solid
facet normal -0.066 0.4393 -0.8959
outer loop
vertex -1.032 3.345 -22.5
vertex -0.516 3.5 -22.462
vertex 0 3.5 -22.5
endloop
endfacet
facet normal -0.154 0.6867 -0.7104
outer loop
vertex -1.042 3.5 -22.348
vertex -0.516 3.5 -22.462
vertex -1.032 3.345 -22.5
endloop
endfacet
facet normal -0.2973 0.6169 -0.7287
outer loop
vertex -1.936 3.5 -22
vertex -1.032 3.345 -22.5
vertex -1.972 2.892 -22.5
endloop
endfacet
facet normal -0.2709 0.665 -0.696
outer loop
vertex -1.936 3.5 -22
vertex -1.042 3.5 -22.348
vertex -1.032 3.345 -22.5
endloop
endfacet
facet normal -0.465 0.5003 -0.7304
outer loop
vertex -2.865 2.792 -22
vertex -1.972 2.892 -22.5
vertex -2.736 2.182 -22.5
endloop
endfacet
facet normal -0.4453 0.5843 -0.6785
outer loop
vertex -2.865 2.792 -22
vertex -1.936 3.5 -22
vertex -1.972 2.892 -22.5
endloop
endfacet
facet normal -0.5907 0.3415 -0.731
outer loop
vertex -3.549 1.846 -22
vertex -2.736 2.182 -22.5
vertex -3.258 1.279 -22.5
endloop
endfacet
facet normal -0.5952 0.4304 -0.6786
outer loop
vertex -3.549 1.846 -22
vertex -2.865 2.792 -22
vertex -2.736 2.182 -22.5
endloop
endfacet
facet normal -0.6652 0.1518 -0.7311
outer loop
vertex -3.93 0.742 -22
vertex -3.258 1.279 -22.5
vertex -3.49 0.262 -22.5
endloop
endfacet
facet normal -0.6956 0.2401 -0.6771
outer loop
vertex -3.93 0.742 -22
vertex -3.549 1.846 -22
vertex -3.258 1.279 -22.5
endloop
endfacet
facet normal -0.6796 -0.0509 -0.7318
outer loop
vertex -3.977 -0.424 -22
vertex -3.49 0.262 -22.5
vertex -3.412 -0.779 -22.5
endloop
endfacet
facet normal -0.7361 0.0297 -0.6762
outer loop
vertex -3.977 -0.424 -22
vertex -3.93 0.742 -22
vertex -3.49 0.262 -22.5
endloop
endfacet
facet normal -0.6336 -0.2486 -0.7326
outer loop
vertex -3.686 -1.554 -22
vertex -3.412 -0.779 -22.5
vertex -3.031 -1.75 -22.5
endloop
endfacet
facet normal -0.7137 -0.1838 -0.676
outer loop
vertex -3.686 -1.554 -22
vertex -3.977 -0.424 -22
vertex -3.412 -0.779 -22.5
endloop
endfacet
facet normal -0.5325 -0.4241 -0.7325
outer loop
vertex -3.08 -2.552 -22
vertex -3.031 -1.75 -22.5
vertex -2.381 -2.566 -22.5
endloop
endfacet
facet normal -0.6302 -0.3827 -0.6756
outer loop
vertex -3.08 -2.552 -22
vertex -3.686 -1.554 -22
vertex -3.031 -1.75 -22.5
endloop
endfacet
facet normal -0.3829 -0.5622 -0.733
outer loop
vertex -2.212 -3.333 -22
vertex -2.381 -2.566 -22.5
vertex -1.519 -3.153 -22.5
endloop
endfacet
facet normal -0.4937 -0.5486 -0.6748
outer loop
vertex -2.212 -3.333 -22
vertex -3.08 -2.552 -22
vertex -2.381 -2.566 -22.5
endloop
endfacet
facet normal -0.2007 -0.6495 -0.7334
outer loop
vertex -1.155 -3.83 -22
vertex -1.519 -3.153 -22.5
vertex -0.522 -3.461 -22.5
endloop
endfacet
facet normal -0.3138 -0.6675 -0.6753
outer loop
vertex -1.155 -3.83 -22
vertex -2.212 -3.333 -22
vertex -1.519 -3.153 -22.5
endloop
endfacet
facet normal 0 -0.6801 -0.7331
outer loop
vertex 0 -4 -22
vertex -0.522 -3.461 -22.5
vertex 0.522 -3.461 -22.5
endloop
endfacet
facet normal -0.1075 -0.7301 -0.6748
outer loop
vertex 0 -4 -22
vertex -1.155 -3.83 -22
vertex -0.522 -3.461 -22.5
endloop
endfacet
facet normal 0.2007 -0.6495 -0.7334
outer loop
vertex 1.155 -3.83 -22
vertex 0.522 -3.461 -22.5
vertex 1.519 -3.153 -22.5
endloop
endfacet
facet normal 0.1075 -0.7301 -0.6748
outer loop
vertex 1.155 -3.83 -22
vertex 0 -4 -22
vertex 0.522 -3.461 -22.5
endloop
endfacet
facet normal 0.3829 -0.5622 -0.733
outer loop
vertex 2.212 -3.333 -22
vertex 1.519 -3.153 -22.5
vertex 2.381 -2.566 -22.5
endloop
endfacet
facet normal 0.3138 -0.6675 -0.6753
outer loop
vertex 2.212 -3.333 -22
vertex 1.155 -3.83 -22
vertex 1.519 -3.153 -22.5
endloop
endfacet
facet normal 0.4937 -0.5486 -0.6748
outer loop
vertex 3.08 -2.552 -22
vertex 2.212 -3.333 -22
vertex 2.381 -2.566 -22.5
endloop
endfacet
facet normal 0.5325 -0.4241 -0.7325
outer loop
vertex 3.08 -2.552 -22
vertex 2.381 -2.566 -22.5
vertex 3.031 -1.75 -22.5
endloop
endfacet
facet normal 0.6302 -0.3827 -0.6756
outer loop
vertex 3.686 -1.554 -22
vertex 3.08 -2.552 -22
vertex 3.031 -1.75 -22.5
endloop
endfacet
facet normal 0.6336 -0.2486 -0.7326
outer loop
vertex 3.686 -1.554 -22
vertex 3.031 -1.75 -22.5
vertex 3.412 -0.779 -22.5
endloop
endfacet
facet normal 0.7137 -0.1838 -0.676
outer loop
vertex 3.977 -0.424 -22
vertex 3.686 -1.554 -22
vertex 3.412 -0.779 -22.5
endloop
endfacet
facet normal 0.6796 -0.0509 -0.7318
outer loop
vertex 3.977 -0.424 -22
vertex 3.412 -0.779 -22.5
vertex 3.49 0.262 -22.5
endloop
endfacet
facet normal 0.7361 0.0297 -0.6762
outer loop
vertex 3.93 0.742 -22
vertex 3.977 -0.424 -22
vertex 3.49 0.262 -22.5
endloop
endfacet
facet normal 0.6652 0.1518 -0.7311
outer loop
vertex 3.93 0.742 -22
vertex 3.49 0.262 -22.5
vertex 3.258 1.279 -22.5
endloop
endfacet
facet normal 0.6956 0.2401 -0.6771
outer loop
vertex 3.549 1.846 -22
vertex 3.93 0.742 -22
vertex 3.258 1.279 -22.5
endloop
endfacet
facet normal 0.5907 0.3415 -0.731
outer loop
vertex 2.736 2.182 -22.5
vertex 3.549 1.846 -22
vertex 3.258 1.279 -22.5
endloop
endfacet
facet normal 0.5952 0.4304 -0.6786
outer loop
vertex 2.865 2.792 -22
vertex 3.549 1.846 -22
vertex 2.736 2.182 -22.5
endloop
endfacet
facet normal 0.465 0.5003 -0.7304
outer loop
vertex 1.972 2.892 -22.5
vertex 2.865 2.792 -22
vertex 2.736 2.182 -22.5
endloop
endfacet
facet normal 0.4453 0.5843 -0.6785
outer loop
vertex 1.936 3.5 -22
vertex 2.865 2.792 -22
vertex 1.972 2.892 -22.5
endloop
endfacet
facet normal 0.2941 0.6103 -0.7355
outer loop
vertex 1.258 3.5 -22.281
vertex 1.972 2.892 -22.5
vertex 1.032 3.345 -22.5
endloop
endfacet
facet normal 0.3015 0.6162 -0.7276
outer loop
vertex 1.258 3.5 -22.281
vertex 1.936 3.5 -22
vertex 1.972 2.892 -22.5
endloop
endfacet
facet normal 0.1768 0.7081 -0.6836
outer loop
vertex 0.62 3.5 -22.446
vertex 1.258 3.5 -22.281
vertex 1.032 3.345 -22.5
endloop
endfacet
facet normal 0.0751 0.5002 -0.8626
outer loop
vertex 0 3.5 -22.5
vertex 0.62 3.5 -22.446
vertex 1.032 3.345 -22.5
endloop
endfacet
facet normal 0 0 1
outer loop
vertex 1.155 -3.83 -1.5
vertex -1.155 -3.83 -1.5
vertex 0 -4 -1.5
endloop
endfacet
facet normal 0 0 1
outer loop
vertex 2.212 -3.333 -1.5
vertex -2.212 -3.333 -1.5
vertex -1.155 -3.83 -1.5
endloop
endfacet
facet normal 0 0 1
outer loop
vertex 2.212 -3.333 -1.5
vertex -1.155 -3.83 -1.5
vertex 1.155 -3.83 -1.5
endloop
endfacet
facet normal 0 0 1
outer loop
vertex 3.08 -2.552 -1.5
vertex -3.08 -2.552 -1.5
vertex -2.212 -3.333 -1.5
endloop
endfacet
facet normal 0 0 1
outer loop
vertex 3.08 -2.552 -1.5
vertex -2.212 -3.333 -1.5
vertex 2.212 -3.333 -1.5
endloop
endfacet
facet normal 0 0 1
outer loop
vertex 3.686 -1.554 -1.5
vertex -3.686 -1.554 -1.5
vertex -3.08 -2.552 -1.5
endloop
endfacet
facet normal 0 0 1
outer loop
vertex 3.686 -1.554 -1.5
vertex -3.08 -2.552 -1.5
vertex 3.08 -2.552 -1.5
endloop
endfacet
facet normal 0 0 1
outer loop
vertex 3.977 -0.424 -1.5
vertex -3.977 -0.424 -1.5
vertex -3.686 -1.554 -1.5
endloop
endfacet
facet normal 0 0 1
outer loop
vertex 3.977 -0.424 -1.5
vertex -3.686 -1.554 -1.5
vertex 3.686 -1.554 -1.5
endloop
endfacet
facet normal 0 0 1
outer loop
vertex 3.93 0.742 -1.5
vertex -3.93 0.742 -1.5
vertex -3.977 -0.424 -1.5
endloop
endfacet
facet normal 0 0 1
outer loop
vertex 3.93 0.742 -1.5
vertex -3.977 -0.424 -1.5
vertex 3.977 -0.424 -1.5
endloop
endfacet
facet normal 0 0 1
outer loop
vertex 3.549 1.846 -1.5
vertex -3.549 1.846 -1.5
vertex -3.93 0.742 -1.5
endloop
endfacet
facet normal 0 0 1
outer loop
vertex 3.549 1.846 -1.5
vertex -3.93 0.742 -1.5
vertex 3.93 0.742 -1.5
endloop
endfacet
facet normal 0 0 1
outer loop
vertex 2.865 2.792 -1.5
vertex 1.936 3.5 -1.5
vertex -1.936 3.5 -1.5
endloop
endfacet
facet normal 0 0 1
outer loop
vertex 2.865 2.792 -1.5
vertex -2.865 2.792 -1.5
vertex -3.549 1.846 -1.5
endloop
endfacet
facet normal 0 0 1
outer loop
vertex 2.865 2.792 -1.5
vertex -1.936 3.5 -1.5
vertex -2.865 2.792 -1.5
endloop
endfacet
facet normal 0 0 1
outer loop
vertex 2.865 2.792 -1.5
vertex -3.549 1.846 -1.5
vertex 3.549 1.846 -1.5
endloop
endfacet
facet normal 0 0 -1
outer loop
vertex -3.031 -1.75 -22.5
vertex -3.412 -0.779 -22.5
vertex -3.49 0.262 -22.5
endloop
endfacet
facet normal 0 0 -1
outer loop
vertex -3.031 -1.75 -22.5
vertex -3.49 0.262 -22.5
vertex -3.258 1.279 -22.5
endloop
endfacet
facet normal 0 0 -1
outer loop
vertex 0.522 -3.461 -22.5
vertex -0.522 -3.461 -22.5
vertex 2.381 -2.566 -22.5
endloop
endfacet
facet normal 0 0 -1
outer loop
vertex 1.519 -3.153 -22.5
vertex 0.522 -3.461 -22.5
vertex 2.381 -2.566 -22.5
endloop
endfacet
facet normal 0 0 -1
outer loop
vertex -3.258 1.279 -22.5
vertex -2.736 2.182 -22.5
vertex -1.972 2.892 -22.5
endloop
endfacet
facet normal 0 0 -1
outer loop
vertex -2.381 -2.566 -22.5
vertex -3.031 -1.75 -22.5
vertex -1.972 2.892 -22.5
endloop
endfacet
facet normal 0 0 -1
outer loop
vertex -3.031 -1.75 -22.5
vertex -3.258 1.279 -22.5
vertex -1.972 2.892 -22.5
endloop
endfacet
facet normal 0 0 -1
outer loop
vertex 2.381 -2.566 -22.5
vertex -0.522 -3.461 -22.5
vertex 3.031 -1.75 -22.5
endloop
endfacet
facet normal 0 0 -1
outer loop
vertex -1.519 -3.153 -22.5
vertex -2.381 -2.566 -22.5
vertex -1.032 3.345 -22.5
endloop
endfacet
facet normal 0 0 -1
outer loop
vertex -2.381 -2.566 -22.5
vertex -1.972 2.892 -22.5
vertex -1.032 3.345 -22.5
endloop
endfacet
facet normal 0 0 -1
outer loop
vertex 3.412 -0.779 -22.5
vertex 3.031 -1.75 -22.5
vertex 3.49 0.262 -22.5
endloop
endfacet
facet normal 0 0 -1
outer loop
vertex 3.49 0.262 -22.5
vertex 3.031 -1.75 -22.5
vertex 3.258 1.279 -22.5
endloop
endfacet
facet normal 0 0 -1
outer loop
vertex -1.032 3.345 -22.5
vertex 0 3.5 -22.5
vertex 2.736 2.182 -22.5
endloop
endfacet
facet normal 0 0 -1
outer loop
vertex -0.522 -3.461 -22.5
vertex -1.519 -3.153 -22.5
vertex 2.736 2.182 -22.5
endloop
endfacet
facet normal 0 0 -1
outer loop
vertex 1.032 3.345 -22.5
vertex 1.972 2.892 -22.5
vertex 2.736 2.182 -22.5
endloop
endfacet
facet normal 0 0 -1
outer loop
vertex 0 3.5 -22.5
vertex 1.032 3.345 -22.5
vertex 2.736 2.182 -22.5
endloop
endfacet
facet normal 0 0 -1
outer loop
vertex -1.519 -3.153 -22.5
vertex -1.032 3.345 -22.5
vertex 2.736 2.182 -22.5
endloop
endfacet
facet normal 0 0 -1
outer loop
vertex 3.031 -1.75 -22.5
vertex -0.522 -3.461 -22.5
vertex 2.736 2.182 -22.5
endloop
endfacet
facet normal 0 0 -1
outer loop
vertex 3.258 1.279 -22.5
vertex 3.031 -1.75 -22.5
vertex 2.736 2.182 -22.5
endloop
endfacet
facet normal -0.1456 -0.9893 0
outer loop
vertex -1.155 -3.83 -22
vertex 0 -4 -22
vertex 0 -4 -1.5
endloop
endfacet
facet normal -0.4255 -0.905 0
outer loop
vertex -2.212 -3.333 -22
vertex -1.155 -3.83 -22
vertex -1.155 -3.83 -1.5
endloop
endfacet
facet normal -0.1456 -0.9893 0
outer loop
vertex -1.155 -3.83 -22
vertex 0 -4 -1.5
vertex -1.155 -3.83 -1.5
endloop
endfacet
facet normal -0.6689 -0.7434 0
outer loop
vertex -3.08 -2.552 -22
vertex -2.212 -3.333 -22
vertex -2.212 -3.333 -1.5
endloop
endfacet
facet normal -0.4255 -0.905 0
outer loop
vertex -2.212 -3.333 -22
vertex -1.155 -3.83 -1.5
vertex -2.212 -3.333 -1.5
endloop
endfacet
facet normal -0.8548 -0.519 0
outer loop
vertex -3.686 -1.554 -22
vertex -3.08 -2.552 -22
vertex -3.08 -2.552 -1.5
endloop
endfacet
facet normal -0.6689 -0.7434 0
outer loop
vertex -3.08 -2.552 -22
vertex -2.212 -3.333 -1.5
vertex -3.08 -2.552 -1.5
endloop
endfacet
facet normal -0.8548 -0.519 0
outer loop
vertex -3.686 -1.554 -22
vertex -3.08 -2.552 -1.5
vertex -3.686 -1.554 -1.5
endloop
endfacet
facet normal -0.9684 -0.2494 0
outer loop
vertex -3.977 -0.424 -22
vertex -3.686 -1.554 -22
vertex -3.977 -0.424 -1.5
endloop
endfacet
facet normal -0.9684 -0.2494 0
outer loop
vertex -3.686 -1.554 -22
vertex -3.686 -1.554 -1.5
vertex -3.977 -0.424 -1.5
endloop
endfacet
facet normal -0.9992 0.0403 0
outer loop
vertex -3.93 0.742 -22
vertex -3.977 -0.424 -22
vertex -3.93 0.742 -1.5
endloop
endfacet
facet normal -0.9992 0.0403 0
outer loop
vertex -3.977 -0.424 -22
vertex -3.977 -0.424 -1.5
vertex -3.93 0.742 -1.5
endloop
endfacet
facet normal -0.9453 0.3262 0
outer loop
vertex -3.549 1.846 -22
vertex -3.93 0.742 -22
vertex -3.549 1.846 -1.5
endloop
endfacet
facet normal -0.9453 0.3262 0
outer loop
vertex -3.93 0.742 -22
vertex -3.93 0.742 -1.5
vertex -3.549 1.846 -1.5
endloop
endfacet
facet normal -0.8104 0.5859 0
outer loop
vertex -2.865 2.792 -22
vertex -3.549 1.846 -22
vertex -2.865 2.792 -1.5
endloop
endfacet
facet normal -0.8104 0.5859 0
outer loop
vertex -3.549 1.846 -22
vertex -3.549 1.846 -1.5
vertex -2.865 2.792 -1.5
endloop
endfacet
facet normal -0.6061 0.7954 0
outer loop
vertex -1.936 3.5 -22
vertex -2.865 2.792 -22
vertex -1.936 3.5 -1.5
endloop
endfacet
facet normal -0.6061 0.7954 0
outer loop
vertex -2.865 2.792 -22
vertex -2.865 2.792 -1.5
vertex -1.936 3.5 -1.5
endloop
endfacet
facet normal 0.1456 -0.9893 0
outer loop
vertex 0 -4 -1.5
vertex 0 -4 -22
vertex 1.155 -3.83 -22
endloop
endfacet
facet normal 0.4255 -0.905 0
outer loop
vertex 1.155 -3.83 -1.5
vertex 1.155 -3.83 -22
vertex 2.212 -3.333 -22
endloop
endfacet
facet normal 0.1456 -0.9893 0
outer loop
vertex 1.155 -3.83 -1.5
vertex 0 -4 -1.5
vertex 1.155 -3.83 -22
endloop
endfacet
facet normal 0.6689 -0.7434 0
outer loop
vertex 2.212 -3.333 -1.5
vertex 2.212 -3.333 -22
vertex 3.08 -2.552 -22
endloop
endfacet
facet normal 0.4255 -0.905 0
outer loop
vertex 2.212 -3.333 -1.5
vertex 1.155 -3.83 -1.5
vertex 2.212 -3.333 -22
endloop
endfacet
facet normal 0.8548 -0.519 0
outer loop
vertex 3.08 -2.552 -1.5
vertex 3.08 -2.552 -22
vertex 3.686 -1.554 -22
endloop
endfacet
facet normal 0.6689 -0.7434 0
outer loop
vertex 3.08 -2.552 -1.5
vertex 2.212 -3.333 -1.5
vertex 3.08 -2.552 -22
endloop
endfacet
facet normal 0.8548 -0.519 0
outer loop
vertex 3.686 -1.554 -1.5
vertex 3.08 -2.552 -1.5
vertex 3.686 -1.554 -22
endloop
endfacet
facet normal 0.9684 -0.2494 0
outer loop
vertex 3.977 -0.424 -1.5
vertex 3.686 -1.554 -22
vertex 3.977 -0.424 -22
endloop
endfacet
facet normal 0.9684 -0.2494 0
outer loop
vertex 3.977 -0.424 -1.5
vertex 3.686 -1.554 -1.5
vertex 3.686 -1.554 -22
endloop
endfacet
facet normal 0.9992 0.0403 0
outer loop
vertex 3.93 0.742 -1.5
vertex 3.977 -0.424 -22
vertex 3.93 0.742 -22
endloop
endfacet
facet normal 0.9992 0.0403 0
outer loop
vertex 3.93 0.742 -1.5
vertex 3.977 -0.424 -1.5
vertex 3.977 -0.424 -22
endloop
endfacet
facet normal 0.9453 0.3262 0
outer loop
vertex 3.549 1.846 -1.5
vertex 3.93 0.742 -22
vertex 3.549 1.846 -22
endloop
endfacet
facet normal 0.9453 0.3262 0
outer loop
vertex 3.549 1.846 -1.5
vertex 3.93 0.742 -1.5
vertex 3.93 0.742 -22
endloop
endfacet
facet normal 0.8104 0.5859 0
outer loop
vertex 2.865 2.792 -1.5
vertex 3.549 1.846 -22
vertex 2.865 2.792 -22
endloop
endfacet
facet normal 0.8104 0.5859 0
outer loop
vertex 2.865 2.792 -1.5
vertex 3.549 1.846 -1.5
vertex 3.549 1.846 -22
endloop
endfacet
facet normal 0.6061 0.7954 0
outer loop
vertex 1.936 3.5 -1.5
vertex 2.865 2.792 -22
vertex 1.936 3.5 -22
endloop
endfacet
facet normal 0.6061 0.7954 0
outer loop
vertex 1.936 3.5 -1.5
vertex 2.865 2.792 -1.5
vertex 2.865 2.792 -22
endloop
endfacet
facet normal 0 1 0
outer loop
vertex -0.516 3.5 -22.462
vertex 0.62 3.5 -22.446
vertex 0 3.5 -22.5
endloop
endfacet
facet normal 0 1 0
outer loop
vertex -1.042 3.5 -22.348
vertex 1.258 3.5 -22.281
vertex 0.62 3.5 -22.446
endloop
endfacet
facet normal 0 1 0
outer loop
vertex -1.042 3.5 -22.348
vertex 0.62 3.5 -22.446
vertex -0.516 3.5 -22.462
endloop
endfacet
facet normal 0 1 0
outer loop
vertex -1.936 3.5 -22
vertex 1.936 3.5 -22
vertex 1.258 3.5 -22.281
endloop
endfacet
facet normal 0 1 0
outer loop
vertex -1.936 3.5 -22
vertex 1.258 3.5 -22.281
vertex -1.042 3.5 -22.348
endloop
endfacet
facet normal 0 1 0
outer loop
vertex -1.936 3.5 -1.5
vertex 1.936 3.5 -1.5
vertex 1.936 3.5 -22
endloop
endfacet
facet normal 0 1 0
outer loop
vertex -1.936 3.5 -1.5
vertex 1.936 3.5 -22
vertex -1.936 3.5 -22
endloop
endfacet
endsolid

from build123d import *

# Parameters (mm, degrees)
PAD001_DEPTH = 21


with BuildPart() as part:
    # Sketch002 → Pad001 (new body)
    with BuildSketch(Plane.XY):
        with BuildLine():
            Line((0, 3.5), (1.936492, 3.5))
            ThreePointArc((0, -4), (3.872983, -1), (1.936492, 3.5))
            Line((0, -4), (0, 3.5))
        make_face()
    pad001 = extrude(amount=-PAD001_DEPTH)

    # Mirrored002: Pad001 across Sketch002 V_Axis
    add(pad001.mirror(Plane(origin=(0, 0, 0), x_dir=(0, 0, 1), z_dir=(1, 0, 0))))

    # Sketch003 → Groove (revolve, cut)
    with BuildSketch(Plane.YZ):
        Polygon((3.5, -21), (4, -20.5), (4, -21), align=None)
    revolve(axis=Axis((0, 0, 0), (0, 0, 1)), mode=Mode.SUBTRACT)


with BuildPart() as part_1:
    # Body001 placement: moved
    add(part.part.moved(Location((0, 0, -1.5))))


solid = part_1.part
